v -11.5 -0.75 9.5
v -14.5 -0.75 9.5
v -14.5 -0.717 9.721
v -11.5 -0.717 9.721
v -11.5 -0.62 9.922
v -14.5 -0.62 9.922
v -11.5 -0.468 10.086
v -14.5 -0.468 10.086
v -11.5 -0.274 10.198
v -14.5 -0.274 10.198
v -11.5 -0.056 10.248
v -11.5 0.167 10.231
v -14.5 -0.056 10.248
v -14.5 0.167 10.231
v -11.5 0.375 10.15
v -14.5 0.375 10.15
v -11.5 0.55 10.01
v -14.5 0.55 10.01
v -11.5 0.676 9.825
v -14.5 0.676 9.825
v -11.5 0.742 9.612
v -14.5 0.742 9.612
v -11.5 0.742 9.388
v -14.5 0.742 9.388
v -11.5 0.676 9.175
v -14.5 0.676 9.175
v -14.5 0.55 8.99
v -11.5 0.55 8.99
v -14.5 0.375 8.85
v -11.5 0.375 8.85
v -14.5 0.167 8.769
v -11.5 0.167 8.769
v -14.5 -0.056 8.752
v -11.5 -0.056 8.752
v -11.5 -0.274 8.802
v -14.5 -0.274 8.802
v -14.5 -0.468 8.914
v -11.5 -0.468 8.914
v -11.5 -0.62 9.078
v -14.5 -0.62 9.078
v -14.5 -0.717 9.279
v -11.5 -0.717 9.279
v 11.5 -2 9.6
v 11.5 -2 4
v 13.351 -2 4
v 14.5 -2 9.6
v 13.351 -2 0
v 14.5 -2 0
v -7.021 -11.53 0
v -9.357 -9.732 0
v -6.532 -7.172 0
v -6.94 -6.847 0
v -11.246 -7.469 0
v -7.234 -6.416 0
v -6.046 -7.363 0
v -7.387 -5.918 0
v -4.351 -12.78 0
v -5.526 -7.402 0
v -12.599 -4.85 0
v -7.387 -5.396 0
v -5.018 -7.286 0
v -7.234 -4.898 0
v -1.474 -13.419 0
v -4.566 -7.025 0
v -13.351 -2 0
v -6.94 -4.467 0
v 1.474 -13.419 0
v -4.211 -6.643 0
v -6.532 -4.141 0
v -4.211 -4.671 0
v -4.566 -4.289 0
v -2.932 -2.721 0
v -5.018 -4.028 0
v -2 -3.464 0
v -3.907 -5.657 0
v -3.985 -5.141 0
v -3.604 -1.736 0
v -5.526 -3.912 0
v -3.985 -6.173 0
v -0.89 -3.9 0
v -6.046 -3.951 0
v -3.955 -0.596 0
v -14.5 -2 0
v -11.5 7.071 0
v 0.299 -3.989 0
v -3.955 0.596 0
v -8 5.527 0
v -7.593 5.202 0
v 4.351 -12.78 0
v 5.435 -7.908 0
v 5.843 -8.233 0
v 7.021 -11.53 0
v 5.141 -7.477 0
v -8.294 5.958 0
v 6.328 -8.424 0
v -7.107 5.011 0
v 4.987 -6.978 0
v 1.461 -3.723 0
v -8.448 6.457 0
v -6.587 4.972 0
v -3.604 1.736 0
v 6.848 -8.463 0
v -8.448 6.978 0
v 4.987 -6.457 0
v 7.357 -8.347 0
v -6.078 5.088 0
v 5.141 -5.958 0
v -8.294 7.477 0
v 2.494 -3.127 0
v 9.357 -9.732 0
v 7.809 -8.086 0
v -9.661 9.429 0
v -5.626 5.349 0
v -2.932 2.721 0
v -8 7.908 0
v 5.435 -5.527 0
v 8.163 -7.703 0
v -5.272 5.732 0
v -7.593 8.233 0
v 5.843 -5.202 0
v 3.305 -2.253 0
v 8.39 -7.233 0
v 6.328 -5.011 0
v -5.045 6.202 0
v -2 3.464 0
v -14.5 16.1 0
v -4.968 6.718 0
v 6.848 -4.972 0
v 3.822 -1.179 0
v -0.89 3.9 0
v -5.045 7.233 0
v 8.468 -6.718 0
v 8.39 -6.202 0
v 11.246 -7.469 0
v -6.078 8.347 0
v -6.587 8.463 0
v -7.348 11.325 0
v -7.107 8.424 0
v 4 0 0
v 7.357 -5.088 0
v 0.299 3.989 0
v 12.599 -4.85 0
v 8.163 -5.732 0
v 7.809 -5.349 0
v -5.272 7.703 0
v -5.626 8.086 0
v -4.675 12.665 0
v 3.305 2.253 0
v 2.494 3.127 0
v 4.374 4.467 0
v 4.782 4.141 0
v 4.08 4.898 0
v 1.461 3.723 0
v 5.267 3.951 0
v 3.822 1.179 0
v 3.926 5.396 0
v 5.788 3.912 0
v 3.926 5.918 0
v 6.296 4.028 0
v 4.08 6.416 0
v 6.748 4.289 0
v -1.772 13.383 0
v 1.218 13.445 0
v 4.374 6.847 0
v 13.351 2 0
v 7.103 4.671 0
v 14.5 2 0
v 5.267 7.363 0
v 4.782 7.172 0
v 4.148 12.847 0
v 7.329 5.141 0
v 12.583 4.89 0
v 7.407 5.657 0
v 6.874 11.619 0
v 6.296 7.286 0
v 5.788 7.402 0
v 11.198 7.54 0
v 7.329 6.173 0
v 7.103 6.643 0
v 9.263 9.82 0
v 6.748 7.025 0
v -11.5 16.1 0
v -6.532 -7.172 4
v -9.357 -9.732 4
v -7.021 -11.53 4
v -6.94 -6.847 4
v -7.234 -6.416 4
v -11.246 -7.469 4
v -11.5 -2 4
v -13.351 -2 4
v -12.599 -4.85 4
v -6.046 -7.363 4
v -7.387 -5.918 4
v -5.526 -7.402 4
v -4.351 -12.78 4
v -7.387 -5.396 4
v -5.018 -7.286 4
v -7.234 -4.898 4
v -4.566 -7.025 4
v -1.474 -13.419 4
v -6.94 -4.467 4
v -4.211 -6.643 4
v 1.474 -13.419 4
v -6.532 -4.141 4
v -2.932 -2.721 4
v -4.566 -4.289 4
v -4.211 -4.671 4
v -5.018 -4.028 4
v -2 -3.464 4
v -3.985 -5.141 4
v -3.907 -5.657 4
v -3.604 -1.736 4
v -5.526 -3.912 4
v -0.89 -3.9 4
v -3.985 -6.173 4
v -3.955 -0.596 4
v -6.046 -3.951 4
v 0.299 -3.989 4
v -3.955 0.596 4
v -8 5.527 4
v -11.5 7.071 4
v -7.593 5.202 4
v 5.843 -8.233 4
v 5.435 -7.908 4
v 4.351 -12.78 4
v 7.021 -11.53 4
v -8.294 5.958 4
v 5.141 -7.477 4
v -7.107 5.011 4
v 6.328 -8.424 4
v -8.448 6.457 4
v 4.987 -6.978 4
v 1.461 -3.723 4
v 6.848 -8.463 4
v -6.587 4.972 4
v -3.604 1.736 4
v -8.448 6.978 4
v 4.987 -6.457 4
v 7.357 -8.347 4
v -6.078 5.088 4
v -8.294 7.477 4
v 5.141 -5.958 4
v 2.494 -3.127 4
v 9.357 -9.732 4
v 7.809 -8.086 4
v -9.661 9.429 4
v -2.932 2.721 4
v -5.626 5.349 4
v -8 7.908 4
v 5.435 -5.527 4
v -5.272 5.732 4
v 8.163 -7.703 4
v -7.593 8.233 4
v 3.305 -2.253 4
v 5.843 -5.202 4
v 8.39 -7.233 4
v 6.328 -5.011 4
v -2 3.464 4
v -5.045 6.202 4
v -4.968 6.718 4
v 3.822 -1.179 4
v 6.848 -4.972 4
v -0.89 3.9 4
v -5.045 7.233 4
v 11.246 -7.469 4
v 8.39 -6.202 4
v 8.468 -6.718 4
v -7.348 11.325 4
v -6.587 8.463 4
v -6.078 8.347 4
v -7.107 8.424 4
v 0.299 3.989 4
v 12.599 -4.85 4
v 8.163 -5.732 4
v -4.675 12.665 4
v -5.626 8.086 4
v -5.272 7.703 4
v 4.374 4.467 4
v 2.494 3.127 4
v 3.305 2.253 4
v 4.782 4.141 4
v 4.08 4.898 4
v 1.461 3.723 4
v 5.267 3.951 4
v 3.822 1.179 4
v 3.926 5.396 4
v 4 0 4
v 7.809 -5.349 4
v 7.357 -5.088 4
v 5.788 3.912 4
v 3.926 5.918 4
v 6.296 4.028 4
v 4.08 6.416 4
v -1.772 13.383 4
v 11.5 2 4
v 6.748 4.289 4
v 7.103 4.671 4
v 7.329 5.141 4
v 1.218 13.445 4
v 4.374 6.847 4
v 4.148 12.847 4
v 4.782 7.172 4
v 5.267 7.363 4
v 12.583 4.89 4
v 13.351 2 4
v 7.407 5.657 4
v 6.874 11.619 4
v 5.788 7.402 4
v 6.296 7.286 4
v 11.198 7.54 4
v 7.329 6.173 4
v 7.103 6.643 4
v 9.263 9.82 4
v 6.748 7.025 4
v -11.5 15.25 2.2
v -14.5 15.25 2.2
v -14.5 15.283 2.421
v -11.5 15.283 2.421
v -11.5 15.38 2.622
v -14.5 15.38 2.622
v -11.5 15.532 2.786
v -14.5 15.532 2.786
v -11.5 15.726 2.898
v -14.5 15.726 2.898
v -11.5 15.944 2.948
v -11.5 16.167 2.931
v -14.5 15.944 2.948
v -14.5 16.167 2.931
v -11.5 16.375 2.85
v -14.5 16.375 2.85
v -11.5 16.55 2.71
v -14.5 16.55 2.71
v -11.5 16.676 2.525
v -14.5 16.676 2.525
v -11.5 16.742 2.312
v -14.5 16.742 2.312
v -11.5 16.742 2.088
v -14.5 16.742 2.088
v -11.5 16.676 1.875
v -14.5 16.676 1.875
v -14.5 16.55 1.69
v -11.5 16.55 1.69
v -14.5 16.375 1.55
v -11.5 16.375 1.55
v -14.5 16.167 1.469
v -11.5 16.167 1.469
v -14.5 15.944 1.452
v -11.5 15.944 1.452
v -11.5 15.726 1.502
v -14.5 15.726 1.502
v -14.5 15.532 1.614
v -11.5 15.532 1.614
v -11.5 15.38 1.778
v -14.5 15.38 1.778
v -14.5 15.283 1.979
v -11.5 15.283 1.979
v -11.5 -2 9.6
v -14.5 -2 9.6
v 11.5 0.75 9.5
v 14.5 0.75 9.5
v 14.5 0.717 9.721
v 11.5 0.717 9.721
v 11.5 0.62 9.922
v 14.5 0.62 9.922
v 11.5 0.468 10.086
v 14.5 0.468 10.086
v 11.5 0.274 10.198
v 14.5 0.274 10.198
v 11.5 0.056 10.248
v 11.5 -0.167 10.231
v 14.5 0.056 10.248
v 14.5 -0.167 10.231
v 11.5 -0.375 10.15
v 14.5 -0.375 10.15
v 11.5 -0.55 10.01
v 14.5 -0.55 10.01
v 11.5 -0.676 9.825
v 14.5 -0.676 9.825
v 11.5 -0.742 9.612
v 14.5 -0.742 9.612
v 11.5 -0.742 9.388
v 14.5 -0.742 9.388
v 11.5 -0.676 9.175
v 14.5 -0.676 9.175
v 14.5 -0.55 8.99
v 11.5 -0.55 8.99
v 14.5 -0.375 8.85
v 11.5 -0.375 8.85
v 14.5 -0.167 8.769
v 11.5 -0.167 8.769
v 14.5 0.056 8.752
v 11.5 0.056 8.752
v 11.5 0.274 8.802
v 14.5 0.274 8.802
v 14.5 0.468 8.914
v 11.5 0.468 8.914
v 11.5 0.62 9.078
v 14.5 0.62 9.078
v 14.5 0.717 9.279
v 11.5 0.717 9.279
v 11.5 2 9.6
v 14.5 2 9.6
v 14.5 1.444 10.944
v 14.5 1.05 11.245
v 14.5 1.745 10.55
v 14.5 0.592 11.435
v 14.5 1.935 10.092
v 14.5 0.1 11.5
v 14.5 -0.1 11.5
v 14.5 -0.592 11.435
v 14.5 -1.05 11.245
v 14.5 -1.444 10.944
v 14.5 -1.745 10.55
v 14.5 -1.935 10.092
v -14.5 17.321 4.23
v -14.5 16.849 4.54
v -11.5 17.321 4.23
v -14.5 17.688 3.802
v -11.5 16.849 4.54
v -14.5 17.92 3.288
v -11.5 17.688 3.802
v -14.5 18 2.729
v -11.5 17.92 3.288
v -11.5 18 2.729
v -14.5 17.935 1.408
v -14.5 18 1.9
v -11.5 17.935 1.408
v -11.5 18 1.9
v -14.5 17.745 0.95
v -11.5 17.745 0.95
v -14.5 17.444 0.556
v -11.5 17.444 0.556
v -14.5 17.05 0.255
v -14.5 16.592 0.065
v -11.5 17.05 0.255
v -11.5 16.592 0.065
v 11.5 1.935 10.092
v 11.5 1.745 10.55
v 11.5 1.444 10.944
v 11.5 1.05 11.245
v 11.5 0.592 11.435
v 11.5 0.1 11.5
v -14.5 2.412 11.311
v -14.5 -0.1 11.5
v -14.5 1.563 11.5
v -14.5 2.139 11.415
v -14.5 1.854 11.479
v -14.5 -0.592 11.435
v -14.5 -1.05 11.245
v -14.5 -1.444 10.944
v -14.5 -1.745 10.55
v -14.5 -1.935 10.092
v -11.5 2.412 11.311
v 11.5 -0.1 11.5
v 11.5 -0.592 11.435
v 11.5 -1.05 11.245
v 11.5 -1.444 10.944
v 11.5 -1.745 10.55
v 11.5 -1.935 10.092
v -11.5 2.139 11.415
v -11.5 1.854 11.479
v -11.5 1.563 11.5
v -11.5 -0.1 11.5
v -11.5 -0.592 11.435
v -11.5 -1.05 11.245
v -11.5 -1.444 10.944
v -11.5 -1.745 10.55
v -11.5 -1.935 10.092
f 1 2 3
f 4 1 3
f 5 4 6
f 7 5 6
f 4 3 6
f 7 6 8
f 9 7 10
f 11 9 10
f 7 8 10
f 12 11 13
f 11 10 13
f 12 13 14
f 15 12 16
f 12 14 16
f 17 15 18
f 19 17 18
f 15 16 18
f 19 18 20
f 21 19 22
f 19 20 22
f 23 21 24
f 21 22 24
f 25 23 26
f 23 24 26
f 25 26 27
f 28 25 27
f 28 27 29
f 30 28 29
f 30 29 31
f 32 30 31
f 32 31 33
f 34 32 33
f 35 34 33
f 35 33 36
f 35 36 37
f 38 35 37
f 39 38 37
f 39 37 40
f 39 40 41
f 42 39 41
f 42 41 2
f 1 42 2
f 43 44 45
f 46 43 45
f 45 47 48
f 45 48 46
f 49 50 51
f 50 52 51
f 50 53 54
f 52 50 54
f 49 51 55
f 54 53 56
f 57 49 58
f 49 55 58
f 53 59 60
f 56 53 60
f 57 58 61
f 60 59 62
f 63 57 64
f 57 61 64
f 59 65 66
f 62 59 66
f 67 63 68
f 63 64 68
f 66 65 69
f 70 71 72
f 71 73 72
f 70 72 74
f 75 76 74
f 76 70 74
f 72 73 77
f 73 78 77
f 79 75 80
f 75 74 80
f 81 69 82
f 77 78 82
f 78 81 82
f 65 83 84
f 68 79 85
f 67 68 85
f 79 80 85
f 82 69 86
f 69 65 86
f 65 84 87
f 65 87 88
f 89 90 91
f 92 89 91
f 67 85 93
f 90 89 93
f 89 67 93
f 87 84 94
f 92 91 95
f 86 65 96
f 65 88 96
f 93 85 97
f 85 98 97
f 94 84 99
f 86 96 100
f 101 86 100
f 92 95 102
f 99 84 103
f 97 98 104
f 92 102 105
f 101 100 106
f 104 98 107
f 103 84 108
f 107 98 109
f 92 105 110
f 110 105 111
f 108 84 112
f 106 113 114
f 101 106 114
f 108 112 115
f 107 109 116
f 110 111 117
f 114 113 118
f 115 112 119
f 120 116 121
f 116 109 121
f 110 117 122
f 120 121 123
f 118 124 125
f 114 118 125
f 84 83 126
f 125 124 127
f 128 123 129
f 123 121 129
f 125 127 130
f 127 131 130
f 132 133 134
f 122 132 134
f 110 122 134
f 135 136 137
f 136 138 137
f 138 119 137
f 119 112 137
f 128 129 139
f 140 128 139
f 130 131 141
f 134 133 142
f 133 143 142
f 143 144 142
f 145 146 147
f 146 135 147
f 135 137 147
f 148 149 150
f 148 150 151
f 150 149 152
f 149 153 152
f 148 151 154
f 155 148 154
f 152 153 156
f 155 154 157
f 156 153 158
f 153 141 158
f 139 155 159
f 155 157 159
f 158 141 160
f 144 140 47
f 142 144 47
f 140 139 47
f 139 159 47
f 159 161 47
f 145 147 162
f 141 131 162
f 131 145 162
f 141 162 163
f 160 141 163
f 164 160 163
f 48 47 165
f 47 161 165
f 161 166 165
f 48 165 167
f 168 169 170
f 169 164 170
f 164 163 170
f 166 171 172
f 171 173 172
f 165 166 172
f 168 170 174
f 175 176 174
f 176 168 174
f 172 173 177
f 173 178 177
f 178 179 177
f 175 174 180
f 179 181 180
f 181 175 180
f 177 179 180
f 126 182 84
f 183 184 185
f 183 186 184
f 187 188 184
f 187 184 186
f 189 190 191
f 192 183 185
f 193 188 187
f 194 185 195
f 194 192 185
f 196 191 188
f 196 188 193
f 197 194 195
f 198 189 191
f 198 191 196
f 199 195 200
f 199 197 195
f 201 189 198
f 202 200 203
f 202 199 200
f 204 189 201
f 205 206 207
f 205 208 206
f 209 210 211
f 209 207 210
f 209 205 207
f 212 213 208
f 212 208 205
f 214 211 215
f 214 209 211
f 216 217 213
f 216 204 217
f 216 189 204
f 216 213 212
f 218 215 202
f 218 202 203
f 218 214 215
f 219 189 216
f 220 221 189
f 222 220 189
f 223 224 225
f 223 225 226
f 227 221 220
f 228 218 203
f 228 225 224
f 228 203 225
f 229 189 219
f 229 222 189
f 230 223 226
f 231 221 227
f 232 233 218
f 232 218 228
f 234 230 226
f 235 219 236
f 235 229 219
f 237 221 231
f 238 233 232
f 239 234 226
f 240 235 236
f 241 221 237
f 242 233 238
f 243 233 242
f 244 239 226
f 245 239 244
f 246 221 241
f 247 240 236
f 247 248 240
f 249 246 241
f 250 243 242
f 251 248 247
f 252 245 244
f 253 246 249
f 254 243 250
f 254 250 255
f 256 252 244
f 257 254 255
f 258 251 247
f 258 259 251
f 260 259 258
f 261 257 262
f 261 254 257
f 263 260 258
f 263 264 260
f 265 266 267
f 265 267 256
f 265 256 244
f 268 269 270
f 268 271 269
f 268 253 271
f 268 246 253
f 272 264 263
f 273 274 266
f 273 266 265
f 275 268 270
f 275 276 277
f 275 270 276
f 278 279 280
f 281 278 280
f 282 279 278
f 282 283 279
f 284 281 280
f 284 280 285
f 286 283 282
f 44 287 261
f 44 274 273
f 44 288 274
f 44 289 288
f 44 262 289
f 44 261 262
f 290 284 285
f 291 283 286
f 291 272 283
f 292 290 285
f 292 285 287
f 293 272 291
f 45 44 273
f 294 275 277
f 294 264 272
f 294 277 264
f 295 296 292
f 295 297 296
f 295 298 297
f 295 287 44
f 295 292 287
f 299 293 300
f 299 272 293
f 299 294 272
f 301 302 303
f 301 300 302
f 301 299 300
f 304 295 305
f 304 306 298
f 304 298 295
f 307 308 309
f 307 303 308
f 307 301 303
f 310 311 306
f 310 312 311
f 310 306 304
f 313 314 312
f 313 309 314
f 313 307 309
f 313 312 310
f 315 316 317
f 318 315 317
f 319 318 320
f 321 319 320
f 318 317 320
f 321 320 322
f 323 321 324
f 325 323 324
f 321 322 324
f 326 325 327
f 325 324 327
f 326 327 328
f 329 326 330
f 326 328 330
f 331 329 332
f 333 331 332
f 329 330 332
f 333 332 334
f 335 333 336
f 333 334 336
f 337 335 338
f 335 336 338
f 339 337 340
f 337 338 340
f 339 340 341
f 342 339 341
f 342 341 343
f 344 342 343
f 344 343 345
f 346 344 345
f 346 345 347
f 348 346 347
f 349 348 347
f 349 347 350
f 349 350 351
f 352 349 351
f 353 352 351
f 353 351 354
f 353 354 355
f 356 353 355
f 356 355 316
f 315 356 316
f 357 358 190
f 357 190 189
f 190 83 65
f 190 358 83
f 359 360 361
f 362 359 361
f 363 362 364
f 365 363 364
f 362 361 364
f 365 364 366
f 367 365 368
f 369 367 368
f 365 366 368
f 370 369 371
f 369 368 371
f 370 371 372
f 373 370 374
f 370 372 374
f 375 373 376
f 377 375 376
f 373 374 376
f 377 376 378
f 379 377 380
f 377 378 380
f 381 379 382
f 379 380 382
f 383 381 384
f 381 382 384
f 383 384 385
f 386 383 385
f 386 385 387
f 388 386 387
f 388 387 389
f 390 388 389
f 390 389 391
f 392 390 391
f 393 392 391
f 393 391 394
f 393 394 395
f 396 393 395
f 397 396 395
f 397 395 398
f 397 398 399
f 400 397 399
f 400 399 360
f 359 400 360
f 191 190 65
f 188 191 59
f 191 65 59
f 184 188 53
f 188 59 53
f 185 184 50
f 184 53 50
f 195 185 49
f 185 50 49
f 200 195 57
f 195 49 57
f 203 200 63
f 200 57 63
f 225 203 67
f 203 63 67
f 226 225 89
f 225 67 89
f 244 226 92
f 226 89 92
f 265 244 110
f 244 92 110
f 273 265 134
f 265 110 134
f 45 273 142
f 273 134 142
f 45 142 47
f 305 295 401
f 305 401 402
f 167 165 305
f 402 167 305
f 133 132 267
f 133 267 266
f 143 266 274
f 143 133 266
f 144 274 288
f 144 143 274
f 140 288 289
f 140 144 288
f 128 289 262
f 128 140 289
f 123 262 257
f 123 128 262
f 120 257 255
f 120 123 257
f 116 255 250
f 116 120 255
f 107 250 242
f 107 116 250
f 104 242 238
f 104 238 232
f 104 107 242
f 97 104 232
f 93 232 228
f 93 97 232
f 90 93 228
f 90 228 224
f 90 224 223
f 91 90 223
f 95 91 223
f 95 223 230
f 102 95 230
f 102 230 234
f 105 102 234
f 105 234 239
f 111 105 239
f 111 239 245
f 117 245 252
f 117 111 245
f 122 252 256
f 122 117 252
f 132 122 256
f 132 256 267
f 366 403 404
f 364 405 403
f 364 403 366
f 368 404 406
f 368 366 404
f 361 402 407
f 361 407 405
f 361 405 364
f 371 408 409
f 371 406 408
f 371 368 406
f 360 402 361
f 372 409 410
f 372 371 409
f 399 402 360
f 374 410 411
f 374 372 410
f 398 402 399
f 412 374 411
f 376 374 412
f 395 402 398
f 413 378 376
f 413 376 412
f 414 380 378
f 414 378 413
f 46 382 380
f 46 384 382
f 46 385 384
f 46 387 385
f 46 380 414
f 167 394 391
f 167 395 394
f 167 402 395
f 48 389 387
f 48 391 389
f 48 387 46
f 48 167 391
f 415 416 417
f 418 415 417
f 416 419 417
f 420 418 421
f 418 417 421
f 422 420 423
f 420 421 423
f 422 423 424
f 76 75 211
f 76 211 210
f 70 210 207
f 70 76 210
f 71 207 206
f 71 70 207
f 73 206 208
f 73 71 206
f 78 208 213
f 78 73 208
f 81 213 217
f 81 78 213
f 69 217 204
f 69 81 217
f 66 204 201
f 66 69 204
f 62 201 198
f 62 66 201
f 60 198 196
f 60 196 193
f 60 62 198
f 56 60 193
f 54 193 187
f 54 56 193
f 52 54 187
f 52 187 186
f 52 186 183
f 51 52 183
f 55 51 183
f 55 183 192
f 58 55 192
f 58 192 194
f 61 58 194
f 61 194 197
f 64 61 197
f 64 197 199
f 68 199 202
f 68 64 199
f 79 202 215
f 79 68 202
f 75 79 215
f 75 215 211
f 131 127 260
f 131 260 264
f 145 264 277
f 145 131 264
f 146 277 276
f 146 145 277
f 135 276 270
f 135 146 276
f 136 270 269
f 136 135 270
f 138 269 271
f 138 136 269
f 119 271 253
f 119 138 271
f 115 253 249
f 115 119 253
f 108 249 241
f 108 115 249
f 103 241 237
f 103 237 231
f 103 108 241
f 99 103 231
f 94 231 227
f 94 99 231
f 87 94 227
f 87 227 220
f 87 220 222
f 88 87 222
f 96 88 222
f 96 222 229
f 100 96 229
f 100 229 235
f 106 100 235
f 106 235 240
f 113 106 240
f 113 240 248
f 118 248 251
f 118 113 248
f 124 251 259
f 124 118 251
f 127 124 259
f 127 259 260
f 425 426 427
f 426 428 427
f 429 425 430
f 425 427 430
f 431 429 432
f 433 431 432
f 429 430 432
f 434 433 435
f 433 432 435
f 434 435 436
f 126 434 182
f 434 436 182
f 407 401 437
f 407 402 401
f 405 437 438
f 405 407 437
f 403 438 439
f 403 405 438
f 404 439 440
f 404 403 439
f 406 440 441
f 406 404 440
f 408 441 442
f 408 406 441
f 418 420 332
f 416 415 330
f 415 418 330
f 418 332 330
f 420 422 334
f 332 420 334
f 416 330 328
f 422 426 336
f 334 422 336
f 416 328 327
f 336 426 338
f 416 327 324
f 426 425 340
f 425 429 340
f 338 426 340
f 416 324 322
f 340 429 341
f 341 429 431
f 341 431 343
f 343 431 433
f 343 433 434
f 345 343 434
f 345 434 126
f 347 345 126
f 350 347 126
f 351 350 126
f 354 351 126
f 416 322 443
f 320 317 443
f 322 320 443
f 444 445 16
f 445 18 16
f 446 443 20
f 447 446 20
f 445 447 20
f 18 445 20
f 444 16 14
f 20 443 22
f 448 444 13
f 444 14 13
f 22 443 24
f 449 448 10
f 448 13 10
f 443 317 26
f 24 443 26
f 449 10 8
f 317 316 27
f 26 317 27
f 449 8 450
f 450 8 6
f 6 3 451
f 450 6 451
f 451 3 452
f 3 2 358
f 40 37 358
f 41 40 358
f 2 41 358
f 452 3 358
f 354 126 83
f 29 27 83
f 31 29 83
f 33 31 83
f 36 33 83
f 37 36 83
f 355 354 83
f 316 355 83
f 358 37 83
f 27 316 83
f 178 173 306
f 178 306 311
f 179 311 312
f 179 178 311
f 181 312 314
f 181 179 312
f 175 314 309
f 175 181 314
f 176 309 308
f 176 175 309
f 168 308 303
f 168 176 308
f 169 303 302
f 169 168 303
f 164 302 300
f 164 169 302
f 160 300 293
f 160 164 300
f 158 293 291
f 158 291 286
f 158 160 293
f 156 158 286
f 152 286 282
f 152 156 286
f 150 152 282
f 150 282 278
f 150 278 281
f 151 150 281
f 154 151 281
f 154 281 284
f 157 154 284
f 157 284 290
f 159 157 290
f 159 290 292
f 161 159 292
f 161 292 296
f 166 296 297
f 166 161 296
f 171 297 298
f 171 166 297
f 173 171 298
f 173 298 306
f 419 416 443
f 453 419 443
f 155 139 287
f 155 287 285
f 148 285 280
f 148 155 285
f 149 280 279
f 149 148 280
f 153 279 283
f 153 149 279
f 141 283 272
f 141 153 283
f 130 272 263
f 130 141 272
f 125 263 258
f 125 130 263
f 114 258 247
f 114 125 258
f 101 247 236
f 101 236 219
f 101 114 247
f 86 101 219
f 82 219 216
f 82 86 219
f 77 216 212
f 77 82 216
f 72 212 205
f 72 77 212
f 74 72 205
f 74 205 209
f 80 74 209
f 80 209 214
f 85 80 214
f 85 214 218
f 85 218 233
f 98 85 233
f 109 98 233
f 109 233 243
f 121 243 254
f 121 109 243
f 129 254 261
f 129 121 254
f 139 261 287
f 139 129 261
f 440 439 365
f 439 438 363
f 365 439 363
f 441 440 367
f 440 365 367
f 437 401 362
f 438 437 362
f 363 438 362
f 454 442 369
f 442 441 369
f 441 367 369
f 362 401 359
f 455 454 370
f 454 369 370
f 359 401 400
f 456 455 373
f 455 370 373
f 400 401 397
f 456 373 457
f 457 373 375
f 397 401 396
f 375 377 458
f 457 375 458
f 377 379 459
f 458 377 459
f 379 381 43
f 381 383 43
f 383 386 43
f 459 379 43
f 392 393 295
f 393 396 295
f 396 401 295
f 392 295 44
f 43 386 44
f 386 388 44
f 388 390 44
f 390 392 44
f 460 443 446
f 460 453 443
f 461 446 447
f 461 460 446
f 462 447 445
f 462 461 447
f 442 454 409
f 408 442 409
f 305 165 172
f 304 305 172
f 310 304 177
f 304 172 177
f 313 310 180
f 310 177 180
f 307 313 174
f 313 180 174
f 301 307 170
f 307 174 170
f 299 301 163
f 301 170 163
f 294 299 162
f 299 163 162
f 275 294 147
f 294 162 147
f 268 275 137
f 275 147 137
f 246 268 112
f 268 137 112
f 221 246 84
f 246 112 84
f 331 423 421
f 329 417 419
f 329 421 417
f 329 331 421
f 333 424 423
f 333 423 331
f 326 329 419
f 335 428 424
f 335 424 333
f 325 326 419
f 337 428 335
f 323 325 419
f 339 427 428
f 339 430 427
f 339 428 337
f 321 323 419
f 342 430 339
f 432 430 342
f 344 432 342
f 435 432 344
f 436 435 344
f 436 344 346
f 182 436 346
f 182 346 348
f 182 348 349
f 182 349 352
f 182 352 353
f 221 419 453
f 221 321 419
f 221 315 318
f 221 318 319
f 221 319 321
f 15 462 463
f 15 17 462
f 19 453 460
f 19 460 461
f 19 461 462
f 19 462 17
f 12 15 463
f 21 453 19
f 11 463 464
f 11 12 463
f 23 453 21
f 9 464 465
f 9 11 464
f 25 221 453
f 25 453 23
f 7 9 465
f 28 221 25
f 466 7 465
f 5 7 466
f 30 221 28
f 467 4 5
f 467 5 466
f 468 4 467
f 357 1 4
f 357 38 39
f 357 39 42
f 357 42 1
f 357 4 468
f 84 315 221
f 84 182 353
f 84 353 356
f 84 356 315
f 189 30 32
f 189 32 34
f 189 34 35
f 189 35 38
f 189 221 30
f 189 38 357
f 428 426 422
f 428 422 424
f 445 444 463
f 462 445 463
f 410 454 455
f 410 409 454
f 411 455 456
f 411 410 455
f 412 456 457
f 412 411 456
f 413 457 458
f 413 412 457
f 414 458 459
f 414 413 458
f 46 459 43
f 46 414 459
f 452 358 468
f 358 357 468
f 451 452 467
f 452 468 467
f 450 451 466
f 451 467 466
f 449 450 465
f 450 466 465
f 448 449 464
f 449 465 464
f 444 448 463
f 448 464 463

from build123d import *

# Parameters (mm, degrees)
SKETCH_R        = 13.5
SKETCH_R_2      = 1.75
SKETCH_R_3      = 4
PAD_DEPTH       = 4
SKETCH001_W     = 3
SKETCH001_H     = 4
SKETCH001_H_2   = 20
PAD001_DEPTH    = 11.5
FILLET_R        = 1.9
FILLET001_R     = 1.9
FILLET002_R     = 1.9
POCKET_DEPTH    = 5
FILLET003_R     = 2
FILLET004_R     = 1.9
FILLET005_R     = 2
SKETCH003_R     = 0.75
POCKET001_DEPTH = 5
SKETCH004_R     = 0.75
POCKET002_DEPTH = 5


with BuildPart() as part:
    # Sketch → Pad (new body)
    with BuildSketch(Plane.XY):
        Circle(SKETCH_R)
        with Locations((-5.656854, -5.656854)):
            Circle(SKETCH_R_2, mode=Mode.SUBTRACT)
        with Locations((5.656854, 5.656854)):
            Circle(SKETCH_R_2, mode=Mode.SUBTRACT)
        with Locations((-6.717514, 6.717514)):
            Circle(SKETCH_R_2, mode=Mode.SUBTRACT)
        with Locations((6.717514, -6.717514)):
            Circle(SKETCH_R_2, mode=Mode.SUBTRACT)
        Circle(SKETCH_R_3, mode=Mode.SUBTRACT)
    extrude(amount=PAD_DEPTH)

    # Sketch001 (on Face7 of Pad) → Pad001 (join)
    with BuildSketch(Plane(origin=(0, 0, 0), x_dir=(1, 0, 0), z_dir=(0, 0, -1))):
        with Locations((13, 0)):
            Rectangle(SKETCH001_W, SKETCH001_H)
        with Locations((-13, -8)):
            Rectangle(SKETCH001_W, SKETCH001_H_2)
    extrude(amount=-PAD001_DEPTH)

    # Fillet
    fillet_edges = [part.edges().sort_by_distance(p)[0] for p in [
        (13, 2, 11.5),
    ]]
    fillet(fillet_edges, radius=FILLET_R)

    # Fillet001
    fillet001_edges = [part.edges().sort_by_distance(p)[0] for p in [
        (13, -2, 11.5),
    ]]
    fillet(fillet001_edges, radius=FILLET001_R)

    # Fillet002
    fillet002_edges = [part.edges().sort_by_distance(p)[0] for p in [
        (-13, -2, 11.5),
    ]]
    fillet(fillet002_edges, radius=FILLET002_R)

    # Sketch002 (on Face5 of Fillet002) → Pocket (cut)
    with BuildSketch(Plane(origin=(-14.5, 0, 0), x_dir=(0, -1, 0), z_dir=(-1, 0, 0))):
        Polygon((-18, 11.5), (-18, 4), (-2.008357, 11.5), align=None)
    extrude(amount=-POCKET_DEPTH, mode=Mode.SUBTRACT)

    # Fillet003
    fillet003_edges = [part.edges().sort_by_distance(p)[0] for p in [
        (-13, 18, 4),
    ]]
    fillet(fillet003_edges, radius=FILLET003_R)

    # Fillet004
    fillet004_edges = [part.edges().sort_by_distance(p)[0] for p in [
        (-13, 18, 0),
    ]]
    fillet(fillet004_edges, radius=FILLET004_R)

    # Fillet005
    fillet005_edges = [part.edges().sort_by_distance(p)[0] for p in [
        (-13, 2.008357, 11.5),
    ]]
    fillet(fillet005_edges, radius=FILLET005_R)

    # Sketch003 (on Face13 of Fillet005) → Pocket001 (cut)
    with BuildSketch(Plane(origin=(-14.5, 0, 0), x_dir=(0, -1, 0), z_dir=(-1, 0, 0))):
        with Locations((-16, 2.2)):
            Circle(SKETCH003_R)
        with Locations((0, 9.5)):
            Circle(SKETCH003_R)
    extrude(amount=-POCKET001_DEPTH, mode=Mode.SUBTRACT)

    # Sketch004 (on Face28 of Pocket001) → Pocket002 (cut)
    with BuildSketch(Plane.YZ.offset(14.5)):
        with Locations((0, 9.5)):
            Circle(SKETCH004_R)
    extrude(amount=-POCKET002_DEPTH, mode=Mode.SUBTRACT)


solid = part.part
